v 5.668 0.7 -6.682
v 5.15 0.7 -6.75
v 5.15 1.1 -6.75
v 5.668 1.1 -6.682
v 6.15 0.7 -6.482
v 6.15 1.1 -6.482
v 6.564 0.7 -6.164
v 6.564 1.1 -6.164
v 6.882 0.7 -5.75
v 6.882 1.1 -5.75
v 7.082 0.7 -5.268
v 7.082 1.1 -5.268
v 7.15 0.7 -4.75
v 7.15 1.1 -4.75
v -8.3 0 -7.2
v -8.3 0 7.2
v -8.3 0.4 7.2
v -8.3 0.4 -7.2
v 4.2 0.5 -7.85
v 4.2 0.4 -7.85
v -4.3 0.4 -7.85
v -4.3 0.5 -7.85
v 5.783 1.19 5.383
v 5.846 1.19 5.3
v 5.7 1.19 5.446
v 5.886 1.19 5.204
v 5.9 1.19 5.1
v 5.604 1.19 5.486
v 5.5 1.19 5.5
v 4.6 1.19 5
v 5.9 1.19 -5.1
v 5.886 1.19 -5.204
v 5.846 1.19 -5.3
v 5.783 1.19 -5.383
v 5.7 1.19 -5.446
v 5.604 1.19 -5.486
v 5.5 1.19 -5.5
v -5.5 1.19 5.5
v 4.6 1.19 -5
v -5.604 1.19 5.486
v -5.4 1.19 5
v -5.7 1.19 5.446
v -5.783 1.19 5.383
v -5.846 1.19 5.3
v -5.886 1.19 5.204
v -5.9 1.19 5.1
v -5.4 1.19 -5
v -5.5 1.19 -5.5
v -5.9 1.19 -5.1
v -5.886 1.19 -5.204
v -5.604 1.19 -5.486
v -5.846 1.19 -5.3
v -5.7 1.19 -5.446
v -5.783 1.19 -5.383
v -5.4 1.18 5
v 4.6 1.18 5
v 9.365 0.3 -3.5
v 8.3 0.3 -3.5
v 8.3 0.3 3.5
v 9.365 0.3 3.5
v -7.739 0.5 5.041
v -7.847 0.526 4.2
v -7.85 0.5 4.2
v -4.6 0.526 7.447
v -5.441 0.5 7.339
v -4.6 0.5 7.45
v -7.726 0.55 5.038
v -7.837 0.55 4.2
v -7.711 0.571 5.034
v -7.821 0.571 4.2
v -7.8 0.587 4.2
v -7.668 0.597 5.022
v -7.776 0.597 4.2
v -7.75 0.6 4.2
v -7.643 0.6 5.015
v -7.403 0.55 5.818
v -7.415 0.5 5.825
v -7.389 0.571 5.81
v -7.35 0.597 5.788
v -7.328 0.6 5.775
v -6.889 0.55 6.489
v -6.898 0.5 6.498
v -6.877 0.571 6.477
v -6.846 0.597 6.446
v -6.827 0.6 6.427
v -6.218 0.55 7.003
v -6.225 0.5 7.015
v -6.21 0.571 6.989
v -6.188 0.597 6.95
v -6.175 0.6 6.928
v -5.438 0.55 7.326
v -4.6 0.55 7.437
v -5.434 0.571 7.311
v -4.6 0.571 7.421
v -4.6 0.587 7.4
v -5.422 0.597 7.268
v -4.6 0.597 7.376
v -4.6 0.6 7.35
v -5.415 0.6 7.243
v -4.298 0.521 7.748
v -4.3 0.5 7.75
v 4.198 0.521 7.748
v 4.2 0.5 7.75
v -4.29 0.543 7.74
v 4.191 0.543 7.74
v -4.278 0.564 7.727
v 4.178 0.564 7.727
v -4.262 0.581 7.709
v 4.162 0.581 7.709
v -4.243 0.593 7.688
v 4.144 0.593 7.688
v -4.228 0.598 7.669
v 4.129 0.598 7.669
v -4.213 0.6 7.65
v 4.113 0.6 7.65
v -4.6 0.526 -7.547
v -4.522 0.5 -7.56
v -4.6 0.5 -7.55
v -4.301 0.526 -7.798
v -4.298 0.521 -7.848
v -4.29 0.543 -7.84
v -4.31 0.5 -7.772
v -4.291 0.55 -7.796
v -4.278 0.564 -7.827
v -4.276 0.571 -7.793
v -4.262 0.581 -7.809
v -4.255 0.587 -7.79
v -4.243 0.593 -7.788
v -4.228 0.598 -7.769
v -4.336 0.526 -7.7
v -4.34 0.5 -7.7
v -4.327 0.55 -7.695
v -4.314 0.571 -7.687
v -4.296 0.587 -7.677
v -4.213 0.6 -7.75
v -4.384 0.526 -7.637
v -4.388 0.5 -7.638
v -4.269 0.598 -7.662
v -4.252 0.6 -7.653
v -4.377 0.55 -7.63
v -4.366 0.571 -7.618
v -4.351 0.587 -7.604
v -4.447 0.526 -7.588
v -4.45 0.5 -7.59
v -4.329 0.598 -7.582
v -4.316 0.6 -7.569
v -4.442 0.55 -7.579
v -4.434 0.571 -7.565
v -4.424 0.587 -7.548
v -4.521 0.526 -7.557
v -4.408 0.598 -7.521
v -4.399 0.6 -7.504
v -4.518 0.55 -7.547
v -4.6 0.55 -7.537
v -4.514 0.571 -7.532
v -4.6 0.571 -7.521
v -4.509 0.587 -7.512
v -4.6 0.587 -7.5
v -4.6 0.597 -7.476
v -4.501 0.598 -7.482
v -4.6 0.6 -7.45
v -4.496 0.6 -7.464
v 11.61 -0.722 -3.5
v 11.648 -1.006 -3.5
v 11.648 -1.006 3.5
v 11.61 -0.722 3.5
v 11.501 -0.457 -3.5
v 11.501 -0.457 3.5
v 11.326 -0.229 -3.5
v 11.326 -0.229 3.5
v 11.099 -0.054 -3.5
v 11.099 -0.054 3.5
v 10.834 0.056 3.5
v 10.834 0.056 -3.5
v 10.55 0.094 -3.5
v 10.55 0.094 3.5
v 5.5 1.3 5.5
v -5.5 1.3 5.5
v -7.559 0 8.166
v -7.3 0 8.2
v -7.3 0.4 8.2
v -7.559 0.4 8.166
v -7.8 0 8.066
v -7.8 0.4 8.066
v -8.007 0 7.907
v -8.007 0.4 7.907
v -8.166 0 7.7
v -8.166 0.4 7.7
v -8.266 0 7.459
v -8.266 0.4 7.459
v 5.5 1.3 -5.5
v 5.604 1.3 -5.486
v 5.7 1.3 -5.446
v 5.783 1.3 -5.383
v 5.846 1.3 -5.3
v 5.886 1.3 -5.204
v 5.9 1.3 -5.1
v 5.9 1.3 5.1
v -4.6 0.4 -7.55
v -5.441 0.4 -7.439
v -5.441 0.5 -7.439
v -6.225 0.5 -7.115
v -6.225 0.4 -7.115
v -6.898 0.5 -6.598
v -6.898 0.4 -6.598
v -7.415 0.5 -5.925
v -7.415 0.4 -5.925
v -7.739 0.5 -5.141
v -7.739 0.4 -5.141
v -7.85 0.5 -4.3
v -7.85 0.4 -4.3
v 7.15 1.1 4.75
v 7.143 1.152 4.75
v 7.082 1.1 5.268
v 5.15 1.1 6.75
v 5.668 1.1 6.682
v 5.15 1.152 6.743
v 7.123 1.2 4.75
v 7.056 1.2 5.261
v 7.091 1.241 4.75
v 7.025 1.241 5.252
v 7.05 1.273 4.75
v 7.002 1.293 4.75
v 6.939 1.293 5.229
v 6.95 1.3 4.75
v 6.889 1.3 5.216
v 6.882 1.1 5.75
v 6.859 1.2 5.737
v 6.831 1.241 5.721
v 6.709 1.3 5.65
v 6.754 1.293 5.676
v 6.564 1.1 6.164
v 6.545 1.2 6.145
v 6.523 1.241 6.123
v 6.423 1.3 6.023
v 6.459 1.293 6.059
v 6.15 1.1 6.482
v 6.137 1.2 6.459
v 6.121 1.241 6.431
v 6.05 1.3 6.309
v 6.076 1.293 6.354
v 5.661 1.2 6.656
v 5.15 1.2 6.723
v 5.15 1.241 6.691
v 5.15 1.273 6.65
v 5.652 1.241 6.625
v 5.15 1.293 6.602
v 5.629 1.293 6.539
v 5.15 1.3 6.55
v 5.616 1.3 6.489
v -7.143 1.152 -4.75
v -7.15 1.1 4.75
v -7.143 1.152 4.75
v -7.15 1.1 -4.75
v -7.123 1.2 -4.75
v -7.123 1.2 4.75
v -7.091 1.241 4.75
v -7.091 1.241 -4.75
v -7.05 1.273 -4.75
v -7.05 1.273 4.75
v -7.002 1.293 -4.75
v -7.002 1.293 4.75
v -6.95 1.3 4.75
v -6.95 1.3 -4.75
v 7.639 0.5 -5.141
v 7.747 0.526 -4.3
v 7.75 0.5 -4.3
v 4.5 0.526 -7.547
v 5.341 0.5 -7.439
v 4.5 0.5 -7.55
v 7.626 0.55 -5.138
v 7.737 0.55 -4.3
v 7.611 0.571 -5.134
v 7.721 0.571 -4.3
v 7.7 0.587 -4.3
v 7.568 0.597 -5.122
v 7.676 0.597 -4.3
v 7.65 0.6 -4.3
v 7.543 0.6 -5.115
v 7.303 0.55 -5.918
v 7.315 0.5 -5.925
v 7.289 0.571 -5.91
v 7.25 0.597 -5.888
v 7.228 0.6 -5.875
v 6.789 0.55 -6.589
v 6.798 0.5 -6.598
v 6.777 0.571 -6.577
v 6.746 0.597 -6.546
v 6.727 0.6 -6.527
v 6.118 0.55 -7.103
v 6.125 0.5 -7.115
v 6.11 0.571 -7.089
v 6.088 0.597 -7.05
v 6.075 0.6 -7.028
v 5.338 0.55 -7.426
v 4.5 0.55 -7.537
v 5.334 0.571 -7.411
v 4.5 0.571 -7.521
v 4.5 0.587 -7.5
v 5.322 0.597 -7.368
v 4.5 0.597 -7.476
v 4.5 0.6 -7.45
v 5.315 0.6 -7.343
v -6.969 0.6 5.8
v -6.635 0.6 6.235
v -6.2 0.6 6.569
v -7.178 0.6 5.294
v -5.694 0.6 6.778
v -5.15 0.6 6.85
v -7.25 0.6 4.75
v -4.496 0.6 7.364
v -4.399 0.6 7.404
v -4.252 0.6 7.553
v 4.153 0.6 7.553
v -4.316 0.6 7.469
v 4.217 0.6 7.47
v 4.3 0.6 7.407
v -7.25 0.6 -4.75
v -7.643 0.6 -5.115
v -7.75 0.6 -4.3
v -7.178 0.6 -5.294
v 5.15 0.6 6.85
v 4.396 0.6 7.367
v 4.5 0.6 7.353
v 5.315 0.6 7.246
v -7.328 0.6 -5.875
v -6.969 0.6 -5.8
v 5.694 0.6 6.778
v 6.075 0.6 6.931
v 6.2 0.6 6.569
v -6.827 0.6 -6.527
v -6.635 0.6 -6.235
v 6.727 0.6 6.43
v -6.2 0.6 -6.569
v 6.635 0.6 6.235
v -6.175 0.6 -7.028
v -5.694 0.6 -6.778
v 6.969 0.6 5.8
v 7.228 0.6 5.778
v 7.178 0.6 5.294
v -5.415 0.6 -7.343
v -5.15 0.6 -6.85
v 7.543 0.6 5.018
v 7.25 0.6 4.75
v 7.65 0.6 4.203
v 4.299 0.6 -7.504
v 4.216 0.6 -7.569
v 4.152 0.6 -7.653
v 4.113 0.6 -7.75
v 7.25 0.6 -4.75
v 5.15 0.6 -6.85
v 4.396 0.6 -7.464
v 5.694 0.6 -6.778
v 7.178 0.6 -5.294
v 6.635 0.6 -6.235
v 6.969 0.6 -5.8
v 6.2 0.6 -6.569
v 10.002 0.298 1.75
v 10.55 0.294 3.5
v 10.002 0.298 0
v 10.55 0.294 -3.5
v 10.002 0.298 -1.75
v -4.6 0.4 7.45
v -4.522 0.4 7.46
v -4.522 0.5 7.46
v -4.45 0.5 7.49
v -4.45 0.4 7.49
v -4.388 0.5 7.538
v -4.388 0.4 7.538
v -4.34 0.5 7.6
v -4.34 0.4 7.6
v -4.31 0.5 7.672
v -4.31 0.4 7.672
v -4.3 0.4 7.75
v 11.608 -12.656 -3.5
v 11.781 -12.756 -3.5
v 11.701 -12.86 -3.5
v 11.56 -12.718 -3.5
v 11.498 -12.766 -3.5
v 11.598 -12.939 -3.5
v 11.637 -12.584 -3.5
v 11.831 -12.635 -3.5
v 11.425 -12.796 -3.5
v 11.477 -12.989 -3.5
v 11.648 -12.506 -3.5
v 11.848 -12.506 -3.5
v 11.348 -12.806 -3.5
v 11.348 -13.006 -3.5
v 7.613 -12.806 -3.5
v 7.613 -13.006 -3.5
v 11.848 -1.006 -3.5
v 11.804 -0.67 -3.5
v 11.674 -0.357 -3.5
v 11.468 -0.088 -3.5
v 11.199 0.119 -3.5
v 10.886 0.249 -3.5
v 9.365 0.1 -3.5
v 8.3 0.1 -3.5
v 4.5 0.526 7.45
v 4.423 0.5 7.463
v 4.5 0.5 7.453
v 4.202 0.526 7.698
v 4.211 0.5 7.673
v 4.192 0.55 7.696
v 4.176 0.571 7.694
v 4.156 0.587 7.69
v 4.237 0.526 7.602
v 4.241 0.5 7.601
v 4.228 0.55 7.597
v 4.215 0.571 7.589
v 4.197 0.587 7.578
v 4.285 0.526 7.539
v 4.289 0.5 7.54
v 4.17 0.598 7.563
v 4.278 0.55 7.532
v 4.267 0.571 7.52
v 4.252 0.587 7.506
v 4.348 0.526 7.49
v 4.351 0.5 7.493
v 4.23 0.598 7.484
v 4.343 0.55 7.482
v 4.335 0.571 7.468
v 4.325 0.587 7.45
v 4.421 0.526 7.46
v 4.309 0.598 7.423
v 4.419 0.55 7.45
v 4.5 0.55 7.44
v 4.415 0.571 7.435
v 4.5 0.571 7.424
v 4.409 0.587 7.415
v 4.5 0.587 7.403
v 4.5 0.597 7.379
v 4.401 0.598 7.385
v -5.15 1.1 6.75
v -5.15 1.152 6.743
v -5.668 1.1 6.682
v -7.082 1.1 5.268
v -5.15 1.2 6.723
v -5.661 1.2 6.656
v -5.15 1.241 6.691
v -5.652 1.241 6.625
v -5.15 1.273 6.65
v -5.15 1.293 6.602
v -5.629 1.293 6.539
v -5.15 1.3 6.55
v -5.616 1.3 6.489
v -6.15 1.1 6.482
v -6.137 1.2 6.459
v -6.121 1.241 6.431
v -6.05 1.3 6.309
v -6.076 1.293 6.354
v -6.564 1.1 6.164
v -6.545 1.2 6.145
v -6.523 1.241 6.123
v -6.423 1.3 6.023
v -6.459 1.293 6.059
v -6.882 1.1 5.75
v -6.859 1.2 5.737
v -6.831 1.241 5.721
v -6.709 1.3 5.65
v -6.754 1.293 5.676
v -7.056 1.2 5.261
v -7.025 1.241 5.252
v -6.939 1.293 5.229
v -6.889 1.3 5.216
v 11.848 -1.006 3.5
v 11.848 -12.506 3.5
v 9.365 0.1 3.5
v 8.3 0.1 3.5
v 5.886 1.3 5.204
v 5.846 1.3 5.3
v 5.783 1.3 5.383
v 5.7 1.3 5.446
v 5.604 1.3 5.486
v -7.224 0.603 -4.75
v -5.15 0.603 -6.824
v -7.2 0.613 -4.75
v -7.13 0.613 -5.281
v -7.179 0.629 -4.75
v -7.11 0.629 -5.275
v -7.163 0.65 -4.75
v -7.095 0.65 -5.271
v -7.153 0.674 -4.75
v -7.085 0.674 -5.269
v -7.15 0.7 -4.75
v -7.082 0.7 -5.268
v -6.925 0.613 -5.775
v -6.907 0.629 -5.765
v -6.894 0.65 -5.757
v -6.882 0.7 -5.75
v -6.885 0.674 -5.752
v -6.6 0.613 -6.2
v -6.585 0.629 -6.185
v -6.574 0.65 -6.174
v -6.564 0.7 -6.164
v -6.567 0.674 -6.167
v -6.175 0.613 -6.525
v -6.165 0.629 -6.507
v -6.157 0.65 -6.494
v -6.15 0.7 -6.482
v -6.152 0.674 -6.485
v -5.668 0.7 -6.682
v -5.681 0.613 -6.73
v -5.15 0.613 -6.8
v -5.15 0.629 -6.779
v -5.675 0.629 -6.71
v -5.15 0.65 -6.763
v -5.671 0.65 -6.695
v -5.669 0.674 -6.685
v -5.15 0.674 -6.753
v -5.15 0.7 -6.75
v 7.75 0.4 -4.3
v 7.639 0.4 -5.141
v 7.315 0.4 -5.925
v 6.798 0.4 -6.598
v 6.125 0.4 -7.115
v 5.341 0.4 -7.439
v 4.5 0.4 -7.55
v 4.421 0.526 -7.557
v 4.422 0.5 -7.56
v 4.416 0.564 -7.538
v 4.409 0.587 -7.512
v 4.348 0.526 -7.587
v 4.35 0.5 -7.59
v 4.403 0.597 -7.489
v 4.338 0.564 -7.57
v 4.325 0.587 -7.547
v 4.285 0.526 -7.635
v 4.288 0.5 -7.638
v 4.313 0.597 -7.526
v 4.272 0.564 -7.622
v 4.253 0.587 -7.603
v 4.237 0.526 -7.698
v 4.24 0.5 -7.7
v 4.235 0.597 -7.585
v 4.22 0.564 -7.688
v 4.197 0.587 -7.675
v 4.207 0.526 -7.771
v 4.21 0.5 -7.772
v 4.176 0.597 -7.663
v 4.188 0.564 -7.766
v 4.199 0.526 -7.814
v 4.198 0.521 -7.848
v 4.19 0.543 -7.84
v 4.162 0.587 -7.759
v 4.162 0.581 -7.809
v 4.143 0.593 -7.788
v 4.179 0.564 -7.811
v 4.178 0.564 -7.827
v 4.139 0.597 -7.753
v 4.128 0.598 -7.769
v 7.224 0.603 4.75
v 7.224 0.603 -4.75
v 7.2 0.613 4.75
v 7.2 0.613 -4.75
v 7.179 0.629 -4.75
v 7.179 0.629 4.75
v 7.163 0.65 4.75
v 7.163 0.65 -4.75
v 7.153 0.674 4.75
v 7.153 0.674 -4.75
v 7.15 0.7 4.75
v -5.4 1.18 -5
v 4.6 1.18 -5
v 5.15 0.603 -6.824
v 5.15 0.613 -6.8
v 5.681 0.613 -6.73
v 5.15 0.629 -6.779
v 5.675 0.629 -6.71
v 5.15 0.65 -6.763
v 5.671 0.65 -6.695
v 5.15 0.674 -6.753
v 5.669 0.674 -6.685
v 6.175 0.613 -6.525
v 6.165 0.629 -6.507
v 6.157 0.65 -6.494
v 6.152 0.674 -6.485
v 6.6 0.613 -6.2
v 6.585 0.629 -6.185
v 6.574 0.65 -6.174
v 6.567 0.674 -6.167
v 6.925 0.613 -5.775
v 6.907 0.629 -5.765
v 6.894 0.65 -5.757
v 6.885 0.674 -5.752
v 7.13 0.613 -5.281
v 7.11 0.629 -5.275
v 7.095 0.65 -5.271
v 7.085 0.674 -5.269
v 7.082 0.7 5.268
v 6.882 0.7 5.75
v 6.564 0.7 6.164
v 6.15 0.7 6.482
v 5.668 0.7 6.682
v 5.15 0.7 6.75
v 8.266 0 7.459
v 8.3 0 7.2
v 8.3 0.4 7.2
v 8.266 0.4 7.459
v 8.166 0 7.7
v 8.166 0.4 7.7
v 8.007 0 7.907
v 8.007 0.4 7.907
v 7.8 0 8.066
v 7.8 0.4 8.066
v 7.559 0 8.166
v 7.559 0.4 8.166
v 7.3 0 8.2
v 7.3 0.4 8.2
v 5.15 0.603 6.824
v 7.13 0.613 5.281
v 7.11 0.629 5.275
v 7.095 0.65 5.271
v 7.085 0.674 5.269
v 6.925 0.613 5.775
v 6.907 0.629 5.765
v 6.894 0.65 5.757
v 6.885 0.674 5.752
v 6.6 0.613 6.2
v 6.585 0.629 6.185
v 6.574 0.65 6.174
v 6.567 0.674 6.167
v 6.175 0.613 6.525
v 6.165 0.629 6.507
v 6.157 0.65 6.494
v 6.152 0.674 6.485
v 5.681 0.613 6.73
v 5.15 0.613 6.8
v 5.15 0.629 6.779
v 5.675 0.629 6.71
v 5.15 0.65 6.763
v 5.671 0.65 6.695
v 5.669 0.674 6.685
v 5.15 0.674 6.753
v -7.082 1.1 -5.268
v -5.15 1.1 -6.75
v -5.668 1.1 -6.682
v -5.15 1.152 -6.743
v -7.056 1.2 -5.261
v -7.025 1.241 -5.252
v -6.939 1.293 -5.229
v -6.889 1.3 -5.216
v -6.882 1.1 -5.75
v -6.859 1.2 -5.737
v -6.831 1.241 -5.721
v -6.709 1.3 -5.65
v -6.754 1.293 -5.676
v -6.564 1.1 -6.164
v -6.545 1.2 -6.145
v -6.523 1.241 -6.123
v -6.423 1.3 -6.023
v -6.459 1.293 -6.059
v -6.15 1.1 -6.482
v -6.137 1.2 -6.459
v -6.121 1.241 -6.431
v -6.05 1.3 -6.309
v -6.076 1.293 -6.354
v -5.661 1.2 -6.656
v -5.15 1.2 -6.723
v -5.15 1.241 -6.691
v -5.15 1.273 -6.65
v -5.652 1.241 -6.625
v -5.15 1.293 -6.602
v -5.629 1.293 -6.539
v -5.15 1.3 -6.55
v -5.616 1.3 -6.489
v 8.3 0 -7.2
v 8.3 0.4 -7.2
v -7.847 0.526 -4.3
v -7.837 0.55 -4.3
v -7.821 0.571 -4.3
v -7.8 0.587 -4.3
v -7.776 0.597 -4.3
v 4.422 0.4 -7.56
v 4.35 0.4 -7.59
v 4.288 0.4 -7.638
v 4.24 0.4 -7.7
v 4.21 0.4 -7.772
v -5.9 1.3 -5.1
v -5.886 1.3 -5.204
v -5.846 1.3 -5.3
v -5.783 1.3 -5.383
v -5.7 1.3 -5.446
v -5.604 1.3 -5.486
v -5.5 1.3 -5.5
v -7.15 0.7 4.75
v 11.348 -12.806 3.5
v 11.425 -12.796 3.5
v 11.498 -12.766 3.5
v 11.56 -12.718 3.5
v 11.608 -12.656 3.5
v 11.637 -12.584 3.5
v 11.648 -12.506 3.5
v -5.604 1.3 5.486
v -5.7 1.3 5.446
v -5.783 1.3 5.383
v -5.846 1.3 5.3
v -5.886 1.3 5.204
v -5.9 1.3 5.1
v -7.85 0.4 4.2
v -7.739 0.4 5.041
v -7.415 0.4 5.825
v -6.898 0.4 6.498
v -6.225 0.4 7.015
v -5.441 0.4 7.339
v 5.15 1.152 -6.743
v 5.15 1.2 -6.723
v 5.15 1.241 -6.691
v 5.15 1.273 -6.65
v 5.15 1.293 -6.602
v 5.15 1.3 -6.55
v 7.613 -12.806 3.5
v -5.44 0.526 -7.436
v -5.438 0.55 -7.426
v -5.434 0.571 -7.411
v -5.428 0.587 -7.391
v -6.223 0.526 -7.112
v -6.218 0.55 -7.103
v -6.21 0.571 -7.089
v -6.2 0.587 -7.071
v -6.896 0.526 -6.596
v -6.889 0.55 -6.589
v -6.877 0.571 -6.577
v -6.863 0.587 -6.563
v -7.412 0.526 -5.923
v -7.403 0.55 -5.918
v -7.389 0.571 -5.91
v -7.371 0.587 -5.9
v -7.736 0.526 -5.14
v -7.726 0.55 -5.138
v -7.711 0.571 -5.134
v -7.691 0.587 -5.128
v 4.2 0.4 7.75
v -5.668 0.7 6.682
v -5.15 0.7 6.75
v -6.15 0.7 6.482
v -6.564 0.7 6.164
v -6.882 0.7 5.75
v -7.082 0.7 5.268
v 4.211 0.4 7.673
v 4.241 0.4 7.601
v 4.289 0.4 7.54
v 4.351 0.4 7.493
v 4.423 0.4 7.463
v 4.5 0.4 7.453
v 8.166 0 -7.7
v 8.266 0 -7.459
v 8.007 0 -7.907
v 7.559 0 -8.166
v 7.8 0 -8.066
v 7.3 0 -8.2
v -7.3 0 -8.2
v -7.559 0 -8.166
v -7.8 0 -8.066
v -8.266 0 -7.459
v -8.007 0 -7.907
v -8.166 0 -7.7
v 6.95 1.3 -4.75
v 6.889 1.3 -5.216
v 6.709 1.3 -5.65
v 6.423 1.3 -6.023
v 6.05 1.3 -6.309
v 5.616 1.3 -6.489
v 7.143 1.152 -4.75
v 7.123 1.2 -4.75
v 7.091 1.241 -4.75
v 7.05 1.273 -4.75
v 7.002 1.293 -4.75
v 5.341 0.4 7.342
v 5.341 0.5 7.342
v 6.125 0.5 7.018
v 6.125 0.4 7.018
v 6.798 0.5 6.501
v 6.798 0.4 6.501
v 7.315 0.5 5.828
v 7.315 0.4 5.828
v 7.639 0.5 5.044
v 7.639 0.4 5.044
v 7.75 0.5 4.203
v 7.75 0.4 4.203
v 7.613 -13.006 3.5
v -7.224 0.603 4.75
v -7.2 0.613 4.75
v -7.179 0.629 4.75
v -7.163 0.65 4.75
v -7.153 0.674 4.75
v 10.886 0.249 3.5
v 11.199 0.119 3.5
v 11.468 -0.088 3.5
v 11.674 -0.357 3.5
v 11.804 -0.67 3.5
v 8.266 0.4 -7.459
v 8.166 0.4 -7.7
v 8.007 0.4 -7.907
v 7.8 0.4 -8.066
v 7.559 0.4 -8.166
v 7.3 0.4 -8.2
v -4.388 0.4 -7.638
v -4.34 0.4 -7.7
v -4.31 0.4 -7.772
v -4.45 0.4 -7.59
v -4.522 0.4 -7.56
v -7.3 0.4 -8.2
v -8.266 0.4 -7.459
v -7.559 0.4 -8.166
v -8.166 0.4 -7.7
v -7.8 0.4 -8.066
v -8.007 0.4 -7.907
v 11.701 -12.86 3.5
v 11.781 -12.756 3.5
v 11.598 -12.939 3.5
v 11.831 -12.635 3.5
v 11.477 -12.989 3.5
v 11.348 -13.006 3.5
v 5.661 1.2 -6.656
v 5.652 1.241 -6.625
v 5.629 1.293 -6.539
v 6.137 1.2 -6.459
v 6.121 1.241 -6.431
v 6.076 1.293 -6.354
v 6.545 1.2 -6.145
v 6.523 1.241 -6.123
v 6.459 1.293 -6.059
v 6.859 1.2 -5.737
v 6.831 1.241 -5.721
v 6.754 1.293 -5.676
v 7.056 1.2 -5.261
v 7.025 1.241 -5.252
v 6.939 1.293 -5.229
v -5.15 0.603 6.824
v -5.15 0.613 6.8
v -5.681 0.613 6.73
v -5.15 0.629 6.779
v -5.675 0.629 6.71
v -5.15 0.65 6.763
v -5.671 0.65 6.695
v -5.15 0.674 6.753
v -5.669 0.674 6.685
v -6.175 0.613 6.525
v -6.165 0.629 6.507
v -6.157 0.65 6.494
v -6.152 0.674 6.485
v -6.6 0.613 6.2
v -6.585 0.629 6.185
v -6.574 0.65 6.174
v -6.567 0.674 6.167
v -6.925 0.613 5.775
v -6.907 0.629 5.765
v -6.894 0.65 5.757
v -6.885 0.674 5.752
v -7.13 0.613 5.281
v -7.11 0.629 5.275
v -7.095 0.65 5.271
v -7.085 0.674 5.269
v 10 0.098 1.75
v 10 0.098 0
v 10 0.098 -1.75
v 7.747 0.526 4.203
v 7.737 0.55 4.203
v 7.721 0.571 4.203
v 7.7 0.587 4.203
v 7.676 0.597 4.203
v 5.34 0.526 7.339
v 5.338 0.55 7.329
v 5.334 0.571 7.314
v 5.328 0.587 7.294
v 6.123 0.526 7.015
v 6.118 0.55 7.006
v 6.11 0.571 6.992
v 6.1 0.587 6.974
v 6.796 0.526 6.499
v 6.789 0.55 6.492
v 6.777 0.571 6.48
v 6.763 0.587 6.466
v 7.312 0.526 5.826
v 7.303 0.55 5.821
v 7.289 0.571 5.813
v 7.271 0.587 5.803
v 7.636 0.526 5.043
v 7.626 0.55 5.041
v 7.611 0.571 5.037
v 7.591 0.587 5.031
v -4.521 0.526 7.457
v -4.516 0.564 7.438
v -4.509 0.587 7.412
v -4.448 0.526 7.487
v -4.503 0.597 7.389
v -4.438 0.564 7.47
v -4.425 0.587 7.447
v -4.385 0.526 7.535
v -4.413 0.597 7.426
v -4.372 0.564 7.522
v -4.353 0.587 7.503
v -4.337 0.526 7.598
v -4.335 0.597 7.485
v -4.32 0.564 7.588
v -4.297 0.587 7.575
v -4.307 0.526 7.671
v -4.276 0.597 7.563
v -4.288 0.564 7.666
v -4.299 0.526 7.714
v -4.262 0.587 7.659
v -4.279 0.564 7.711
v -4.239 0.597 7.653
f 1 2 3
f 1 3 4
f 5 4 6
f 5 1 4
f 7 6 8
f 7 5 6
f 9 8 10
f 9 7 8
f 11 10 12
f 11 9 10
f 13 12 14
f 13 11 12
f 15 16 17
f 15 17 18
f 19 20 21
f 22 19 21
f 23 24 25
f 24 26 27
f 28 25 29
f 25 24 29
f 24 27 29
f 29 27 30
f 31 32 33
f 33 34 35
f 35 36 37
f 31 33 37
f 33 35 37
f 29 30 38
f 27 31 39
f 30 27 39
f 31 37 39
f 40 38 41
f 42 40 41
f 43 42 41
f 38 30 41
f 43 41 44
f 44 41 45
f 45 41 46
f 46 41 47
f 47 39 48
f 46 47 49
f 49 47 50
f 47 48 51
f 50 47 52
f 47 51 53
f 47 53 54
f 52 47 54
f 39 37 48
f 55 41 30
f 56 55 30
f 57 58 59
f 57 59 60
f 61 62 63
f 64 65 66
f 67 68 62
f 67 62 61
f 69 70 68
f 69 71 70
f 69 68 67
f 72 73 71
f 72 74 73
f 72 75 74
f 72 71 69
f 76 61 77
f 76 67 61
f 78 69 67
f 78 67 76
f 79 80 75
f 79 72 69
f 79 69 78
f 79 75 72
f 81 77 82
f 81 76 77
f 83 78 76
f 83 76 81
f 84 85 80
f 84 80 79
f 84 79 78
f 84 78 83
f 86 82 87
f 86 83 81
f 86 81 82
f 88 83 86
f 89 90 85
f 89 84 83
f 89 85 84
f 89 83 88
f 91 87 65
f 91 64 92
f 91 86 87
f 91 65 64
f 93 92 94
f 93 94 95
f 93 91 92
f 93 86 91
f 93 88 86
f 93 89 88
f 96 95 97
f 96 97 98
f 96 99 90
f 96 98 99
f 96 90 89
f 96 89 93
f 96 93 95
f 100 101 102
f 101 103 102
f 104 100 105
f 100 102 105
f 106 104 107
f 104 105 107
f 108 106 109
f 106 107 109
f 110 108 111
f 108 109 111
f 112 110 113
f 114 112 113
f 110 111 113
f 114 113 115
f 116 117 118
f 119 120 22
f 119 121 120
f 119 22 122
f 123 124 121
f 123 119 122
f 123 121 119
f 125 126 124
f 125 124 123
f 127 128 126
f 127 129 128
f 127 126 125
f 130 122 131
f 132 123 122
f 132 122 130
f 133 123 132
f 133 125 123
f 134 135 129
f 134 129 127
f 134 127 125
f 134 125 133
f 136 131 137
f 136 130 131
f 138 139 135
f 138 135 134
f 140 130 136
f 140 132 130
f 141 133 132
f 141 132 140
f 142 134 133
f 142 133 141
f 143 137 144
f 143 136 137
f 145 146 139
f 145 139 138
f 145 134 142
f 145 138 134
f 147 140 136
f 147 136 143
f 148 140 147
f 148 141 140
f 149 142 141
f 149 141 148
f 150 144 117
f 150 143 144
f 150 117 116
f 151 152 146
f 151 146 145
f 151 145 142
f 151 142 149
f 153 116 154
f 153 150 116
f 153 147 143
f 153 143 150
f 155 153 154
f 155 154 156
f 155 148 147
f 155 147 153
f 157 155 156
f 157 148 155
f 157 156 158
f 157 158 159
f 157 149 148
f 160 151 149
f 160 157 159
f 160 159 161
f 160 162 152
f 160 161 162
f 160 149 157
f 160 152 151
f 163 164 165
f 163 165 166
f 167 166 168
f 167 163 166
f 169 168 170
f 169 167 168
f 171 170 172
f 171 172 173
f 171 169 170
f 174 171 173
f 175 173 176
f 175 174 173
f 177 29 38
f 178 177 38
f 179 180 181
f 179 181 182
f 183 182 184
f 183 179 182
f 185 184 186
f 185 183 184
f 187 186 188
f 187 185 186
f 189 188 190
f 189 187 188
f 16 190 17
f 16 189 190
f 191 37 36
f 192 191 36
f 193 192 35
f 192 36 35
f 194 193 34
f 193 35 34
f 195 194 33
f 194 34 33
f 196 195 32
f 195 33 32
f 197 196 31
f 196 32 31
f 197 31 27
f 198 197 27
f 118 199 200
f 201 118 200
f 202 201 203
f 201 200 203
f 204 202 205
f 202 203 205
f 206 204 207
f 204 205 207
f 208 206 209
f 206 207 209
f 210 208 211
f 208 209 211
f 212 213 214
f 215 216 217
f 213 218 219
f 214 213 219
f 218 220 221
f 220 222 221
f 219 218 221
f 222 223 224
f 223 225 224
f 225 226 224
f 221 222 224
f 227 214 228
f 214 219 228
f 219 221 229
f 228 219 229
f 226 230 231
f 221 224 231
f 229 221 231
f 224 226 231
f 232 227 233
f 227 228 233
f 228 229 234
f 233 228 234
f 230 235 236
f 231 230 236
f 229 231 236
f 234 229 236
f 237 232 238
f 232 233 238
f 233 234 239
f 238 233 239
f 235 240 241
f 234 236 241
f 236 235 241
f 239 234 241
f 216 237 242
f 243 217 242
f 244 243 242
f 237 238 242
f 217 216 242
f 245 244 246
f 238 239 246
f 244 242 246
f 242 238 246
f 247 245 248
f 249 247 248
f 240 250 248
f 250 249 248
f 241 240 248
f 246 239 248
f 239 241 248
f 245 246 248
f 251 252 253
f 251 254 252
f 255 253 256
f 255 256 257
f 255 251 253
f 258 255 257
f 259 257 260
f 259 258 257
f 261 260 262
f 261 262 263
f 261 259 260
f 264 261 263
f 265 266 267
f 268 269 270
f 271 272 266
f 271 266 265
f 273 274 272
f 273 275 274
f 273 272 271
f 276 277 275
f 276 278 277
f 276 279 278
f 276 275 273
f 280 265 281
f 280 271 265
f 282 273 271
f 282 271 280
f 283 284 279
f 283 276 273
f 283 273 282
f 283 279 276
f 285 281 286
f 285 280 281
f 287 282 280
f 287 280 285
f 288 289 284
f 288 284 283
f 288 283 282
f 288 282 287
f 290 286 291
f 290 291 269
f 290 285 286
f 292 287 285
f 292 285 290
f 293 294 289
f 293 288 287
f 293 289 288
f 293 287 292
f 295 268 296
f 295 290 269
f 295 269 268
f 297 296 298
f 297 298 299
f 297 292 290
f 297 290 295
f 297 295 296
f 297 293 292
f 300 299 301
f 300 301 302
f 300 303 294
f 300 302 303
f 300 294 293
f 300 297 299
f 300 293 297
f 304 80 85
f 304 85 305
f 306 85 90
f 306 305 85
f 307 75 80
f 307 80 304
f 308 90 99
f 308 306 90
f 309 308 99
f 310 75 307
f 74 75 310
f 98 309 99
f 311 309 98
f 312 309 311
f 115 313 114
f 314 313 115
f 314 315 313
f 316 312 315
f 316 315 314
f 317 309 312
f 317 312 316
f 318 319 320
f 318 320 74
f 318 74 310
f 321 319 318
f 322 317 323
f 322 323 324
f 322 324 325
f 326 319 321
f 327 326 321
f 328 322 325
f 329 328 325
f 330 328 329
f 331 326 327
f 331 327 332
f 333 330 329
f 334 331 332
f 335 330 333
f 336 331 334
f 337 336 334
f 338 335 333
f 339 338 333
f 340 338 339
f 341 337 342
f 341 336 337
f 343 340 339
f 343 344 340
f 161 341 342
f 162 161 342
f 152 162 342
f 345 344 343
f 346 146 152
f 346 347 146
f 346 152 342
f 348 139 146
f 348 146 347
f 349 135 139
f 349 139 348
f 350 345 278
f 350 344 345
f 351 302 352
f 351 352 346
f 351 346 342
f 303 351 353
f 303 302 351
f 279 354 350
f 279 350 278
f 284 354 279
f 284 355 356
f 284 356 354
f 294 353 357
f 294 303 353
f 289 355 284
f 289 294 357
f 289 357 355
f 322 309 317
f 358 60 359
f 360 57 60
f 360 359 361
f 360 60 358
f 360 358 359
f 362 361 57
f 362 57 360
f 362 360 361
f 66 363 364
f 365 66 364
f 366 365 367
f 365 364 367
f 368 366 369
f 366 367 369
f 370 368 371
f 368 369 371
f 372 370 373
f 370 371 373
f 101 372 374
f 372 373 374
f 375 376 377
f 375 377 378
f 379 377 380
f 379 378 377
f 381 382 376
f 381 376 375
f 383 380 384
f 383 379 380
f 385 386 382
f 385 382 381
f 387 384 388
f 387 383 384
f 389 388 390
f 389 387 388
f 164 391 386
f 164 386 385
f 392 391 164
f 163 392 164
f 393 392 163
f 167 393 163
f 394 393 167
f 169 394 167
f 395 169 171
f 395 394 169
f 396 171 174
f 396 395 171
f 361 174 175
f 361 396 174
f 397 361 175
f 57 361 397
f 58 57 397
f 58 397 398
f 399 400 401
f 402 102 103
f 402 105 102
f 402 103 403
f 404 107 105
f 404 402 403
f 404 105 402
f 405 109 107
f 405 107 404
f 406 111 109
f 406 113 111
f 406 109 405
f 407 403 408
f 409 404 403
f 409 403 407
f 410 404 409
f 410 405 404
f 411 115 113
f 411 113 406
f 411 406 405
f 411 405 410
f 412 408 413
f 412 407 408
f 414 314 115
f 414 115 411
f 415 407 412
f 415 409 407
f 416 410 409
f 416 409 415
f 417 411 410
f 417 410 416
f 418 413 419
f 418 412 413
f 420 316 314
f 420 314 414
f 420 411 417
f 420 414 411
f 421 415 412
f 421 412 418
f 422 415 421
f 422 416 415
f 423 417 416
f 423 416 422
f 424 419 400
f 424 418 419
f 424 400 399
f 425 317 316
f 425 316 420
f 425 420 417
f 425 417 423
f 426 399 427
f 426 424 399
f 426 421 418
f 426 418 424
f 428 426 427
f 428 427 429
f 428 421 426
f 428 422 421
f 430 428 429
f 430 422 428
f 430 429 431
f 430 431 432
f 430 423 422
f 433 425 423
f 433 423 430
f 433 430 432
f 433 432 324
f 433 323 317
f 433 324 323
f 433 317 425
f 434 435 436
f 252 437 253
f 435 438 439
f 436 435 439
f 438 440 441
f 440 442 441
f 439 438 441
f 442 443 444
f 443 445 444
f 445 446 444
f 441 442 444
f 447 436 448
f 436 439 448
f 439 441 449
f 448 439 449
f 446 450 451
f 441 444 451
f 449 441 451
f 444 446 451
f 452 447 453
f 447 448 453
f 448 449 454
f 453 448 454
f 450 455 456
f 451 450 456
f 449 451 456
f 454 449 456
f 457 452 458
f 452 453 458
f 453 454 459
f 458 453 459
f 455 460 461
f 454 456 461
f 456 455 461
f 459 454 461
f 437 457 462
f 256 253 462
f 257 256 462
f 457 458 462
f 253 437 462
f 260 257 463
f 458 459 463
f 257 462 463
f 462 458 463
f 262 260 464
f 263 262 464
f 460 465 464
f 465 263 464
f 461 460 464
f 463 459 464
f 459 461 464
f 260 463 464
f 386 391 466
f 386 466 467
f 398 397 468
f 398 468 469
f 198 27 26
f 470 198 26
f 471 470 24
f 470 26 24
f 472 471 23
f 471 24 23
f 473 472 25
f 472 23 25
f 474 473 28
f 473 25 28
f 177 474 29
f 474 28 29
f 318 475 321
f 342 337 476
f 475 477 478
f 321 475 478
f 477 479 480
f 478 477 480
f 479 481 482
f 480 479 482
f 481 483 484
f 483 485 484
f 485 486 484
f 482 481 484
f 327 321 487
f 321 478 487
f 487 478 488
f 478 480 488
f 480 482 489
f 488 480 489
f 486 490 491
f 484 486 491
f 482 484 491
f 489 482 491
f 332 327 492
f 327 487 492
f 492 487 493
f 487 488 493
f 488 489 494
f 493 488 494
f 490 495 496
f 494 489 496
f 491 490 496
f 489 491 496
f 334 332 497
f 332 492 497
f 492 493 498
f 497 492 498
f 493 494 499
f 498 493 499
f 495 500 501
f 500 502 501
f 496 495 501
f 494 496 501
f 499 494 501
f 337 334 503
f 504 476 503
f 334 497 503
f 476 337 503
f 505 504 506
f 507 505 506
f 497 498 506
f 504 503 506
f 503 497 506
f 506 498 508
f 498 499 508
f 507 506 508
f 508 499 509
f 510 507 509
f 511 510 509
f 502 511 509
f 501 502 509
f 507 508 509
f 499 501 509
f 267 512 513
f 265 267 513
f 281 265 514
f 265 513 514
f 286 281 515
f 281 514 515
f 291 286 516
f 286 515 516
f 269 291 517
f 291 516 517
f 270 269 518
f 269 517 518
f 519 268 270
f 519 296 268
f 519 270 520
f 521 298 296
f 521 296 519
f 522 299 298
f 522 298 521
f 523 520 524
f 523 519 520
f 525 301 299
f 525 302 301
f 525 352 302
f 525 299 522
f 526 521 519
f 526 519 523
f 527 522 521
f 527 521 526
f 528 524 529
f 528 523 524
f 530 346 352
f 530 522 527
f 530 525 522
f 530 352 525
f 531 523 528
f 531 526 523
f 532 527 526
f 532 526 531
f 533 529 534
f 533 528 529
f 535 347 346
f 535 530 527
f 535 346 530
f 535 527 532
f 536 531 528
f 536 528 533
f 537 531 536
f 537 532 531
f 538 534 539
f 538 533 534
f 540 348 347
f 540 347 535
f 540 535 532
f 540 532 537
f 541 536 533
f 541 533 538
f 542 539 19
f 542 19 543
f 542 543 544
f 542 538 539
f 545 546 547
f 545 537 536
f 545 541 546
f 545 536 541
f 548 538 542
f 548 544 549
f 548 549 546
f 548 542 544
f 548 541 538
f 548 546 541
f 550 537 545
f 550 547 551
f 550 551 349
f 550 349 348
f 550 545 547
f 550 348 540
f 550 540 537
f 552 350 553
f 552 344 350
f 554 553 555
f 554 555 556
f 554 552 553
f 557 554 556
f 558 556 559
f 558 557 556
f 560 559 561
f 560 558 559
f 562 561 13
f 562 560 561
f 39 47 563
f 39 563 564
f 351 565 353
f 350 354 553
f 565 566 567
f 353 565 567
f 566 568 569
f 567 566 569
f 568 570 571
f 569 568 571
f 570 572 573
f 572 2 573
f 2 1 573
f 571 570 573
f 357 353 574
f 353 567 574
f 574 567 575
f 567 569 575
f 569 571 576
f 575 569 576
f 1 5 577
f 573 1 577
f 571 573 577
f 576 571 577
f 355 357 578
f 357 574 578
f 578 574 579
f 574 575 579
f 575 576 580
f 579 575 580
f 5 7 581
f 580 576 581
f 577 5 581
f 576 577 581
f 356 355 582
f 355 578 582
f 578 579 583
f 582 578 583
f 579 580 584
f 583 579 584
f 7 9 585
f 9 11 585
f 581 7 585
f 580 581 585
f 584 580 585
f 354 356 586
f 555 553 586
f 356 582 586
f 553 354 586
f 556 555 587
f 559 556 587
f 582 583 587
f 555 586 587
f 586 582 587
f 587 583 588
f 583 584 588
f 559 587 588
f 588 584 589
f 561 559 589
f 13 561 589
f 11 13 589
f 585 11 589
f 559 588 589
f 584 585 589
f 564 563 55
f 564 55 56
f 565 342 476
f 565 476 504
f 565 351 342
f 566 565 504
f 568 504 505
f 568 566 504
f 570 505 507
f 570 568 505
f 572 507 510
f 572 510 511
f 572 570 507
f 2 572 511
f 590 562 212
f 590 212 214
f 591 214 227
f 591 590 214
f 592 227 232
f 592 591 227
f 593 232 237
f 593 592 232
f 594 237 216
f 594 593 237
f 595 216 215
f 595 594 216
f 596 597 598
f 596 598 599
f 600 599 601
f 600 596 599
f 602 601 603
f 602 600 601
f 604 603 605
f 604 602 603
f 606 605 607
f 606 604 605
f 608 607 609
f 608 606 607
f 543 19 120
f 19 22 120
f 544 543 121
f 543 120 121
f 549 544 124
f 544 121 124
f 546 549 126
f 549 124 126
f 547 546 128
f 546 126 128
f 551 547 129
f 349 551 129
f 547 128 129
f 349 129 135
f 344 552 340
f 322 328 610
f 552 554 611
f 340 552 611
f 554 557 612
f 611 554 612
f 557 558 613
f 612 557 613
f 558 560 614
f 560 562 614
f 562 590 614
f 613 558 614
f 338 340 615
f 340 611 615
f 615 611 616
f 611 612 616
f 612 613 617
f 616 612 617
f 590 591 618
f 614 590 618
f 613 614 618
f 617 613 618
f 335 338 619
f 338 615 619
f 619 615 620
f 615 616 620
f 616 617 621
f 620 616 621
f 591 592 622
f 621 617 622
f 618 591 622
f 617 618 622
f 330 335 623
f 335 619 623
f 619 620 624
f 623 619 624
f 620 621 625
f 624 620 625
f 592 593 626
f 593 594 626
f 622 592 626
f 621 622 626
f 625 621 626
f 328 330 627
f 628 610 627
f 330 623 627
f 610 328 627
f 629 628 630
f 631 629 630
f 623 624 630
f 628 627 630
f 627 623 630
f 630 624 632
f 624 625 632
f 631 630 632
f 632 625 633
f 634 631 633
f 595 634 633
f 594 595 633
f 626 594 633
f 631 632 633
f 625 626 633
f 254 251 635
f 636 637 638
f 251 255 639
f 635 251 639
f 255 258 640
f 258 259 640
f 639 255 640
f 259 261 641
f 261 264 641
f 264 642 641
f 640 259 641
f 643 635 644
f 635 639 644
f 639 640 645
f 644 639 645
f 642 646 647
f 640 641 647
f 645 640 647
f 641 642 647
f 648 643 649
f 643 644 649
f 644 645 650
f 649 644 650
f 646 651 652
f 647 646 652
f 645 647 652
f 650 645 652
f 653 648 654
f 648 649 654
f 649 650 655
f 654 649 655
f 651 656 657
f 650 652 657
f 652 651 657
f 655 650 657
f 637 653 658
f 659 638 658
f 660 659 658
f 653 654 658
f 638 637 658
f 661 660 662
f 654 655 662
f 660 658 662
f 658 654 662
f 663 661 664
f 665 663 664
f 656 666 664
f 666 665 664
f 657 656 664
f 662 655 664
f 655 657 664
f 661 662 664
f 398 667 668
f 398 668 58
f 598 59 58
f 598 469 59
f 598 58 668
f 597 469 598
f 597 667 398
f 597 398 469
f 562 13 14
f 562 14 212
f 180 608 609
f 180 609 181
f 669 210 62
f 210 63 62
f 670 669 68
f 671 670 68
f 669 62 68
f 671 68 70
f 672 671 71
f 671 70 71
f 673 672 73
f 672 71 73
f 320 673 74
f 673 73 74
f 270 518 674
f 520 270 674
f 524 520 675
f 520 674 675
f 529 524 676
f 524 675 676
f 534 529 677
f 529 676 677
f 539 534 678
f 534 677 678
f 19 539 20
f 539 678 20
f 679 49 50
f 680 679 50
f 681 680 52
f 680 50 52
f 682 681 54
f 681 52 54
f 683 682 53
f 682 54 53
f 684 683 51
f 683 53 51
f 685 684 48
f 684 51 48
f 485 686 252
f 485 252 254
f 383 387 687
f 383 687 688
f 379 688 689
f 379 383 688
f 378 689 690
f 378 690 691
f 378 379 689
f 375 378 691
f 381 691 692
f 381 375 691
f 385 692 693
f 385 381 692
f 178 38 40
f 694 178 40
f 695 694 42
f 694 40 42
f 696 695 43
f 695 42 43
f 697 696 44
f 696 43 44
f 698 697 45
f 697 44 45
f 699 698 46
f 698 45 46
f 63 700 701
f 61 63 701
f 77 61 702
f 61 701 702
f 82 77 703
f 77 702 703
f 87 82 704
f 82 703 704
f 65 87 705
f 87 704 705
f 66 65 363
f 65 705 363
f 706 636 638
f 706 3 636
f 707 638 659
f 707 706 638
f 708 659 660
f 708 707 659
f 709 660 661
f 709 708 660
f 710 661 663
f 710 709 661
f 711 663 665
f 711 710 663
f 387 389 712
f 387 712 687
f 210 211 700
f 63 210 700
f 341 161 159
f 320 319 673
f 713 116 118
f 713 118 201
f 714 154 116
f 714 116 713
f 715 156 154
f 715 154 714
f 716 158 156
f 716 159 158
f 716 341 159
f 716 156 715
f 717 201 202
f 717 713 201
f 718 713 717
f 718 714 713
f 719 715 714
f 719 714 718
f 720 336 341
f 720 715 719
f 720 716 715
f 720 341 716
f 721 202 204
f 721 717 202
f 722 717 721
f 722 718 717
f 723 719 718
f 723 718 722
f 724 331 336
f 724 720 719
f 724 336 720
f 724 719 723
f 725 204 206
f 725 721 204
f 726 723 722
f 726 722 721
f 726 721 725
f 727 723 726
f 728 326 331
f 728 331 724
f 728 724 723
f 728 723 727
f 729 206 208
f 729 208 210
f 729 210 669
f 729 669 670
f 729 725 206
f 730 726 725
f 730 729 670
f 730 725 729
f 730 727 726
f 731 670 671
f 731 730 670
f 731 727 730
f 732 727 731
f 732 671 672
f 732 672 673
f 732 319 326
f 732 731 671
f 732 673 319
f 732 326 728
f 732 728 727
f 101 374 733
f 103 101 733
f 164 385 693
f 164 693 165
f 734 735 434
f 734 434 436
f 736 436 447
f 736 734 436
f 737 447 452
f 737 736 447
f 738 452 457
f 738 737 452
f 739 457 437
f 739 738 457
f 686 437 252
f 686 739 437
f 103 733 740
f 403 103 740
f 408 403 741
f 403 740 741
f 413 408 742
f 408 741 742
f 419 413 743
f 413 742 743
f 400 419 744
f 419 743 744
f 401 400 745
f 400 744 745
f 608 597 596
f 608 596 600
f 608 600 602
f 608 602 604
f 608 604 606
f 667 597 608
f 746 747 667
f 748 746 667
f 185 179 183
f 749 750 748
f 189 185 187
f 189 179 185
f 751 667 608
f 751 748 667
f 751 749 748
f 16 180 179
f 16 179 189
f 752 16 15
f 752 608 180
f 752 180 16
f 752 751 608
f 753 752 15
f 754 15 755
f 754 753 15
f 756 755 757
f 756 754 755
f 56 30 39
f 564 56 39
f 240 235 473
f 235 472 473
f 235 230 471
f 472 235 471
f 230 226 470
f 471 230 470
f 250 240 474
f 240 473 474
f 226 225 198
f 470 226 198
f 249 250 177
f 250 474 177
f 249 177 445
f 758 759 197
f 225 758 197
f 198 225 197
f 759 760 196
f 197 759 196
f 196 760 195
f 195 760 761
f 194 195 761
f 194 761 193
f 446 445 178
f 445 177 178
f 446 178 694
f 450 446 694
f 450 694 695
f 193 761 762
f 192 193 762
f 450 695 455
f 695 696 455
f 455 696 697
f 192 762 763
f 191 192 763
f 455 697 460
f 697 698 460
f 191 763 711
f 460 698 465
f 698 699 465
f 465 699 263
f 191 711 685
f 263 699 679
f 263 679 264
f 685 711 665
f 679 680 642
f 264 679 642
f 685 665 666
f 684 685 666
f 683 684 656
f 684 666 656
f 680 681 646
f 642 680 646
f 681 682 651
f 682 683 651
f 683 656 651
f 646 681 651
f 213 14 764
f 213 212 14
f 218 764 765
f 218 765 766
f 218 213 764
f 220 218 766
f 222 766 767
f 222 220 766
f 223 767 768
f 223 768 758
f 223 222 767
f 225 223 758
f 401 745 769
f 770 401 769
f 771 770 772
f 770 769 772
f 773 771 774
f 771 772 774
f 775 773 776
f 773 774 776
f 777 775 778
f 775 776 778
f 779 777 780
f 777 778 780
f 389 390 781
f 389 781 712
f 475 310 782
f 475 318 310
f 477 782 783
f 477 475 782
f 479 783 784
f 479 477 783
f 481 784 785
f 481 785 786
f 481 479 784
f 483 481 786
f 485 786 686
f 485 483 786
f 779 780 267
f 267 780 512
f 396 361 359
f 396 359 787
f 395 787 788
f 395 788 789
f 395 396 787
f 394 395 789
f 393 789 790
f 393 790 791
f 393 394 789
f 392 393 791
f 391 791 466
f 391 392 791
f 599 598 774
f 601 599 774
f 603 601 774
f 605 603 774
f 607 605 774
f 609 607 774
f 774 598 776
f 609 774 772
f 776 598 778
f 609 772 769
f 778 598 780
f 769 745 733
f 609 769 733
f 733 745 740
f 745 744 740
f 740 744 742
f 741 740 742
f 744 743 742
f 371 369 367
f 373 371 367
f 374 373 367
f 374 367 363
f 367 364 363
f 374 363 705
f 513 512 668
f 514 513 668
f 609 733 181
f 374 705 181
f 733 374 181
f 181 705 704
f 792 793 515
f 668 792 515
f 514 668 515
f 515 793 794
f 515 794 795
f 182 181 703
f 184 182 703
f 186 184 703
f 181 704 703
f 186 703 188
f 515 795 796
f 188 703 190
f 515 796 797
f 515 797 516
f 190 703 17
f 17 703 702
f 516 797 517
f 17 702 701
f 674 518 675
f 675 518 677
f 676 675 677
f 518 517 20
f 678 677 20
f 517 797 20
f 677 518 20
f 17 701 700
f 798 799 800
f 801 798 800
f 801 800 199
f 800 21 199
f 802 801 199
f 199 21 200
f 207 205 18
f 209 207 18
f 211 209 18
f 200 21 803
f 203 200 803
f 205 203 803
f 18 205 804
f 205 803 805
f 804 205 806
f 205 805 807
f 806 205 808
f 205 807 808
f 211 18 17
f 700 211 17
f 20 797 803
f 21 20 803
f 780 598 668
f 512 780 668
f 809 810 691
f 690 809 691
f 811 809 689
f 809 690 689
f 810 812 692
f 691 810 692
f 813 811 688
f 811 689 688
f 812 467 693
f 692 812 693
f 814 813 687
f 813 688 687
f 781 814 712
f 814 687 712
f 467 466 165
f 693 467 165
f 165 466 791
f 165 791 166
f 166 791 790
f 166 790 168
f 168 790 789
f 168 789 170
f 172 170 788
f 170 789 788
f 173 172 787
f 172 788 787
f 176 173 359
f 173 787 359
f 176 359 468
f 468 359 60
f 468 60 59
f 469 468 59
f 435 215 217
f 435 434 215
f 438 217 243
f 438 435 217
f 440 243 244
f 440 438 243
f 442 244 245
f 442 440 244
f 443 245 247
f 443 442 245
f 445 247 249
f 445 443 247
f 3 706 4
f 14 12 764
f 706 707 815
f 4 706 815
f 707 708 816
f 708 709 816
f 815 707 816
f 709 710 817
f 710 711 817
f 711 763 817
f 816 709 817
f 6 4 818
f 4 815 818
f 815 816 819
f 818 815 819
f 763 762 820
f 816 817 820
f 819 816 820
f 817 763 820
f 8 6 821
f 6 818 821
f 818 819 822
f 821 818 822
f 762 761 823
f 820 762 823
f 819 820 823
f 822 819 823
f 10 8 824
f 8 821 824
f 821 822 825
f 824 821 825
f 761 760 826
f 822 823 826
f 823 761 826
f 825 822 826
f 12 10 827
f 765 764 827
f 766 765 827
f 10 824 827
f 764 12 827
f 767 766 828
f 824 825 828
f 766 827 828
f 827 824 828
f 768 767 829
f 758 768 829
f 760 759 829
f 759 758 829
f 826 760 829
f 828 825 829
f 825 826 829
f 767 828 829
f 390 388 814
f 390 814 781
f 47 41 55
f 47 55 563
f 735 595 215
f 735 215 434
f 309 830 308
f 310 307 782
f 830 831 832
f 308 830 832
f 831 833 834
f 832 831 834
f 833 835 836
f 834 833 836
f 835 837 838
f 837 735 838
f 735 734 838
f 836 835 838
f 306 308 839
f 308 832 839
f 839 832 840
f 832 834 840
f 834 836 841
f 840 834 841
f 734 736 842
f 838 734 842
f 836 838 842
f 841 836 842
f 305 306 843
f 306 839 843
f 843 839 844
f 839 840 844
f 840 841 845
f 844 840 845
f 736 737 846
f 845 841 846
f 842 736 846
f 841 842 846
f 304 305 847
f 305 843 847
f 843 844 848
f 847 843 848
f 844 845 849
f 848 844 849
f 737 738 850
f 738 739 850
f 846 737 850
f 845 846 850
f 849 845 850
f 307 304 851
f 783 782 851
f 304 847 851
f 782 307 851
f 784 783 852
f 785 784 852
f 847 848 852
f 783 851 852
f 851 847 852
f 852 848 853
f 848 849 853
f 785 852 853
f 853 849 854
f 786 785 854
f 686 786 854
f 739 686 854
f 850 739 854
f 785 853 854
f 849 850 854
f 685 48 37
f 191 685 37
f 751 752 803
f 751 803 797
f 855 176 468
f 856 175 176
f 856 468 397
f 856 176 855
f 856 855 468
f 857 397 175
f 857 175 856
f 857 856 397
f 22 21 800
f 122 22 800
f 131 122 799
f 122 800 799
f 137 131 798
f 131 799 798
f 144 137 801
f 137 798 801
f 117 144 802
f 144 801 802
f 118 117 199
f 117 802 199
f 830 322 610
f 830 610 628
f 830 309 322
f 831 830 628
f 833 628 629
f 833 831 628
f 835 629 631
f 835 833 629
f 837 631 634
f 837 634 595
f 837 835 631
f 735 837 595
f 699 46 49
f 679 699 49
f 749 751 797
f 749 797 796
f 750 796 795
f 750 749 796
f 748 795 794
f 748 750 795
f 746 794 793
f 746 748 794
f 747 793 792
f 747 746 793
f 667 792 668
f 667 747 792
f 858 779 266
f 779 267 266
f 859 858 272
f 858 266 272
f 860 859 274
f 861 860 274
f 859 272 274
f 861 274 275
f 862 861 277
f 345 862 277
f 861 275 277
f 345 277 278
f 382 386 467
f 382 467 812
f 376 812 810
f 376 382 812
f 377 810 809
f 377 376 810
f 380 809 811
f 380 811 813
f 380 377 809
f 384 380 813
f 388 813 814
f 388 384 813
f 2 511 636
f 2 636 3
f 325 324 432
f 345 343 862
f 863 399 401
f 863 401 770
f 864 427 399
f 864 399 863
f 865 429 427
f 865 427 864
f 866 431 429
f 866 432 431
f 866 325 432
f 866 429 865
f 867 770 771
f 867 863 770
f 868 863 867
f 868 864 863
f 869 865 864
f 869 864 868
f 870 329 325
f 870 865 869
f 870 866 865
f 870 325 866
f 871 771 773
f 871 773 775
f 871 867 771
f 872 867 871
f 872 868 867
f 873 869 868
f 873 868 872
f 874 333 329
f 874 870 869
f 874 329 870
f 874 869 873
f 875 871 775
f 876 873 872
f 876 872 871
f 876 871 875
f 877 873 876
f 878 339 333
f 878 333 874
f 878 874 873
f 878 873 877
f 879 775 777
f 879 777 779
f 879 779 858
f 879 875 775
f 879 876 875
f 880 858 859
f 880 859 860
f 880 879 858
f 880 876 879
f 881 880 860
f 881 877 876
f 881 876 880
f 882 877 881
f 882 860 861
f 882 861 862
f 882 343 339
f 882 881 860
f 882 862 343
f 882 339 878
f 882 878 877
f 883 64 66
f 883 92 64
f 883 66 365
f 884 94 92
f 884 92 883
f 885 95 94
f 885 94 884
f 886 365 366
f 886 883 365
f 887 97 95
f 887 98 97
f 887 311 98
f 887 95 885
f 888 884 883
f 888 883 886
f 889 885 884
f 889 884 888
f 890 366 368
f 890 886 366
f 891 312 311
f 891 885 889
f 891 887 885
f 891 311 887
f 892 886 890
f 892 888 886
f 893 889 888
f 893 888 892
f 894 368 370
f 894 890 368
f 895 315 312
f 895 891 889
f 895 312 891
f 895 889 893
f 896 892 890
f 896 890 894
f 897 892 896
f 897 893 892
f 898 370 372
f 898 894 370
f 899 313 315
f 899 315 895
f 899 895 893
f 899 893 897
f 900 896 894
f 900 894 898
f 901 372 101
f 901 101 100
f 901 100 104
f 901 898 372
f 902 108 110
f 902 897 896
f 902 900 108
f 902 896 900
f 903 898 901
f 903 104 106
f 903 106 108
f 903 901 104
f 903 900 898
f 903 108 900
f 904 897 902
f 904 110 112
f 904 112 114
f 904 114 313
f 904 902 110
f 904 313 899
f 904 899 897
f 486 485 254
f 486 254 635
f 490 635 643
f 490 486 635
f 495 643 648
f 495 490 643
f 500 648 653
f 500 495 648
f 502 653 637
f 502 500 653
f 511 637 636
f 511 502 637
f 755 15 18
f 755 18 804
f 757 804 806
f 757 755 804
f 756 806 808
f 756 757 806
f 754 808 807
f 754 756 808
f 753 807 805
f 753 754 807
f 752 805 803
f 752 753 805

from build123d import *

# Parameters (mm, degrees)
EXTRUDE_1_DEPTH      = 0.4
EXTRUDE_2_DEPTH      = 0.6
EXTRUDE_3_DEPTH      = 1.3
EXTRUDE_4_DEPTH      = 1.19
FILLET_1_R           = 0.1
FILLET_2_R           = 0.1
FILLET_3_R           = 0.2
EXTRUDE_5_DEPTH      = 3.5
EXTRUDE_5_DEPTH_BACK = 3.5
EXTRUDE_5_START      = -8.2
SKETCH_3_W           = 10
SKETCH_3_H           = 10
CUT_EXTRUDE_1_DEPTH  = 0.01


with BuildPart() as part:
    # 草图1 → 凸台-拉伸1 (new body)
    with BuildSketch(Plane(origin=(0, 0, 0), x_dir=(1, 0, 0), z_dir=(0, 1, 0))):
        with BuildLine():
            Line((7.3, -8.2), (-7.3, -8.2))
            ThreePointArc((-7.3, -8.2), (-8.007106781, -7.907106781), (-8.3, -7.2))
            Line((-8.3, -7.2), (-8.3, 7.2))
            ThreePointArc((-8.3, 7.2), (-8.007106781, 7.907106781), (-7.3, 8.2))
            Line((-7.3, 8.2), (7.3, 8.2))
            ThreePointArc((7.3, 8.2), (8.007106781, 7.907106781), (8.3, 7.2))
            Line((8.3, 7.2), (8.3, -7.2))
            ThreePointArc((8.3, -7.2), (8.007106781, -7.907106781), (7.3, -8.2))
        make_face()
        with BuildLine():
            Line((7.75, -4.202947793), (7.75, 4.3))
            ThreePointArc((7.75, 4.3), (6.798097039, 6.598097039), (4.5, 7.55))
            ThreePointArc((4.5, 7.55), (4.287867966, 7.637867966), (4.2, 7.85))
            Line((4.2, 7.85), (-4.3, 7.85))
            ThreePointArc((-4.3, 7.85), (-4.387867966, 7.637867966), (-4.6, 7.55))
            ThreePointArc((-4.6, 7.55), (-6.898097039, 6.598097039), (-7.85, 4.3))
            Line((-7.85, 4.3), (-7.85, -4.2))
            ThreePointArc((-7.85, -4.2), (-6.898094676, -6.498099402), (-4.599993316, -7.45))
            ThreePointArc((-4.599993316, -7.45), (-4.387860883, -7.537867748), (-4.299992699, -7.75))
            Line((-4.299992699, -7.75), (4.200007301, -7.75))
            ThreePointArc((4.200007301, -7.75), (4.288905774, -7.539775891), (4.499993425, -7.452947793))
            ThreePointArc((4.499993425, -7.452947793), (6.798094714, -6.501047157), (7.75, -4.202947793))
        make_face(mode=Mode.SUBTRACT)
    extrude(amount=EXTRUDE_1_DEPTH)

    # 草图1<3> → 凸台-拉伸2 (add)
    with BuildSketch(Plane(origin=(0, 0, 0), x_dir=(1, 0, 0), z_dir=(0, 1, 0))):
        with BuildLine():
            Line((7.75, -4.202947793), (7.75, 4.3))
            ThreePointArc((7.75, 4.3), (6.798097039, 6.598097039), (4.5, 7.55))
            ThreePointArc((4.5, 7.55), (4.287867966, 7.637867966), (4.2, 7.85))
            Line((4.2, 7.85), (-4.3, 7.85))
            ThreePointArc((-4.3, 7.85), (-4.387867966, 7.637867966), (-4.6, 7.55))
            ThreePointArc((-4.6, 7.55), (-6.898097039, 6.598097039), (-7.85, 4.3))
            Line((-7.85, 4.3), (-7.85, -4.2))
            ThreePointArc((-7.85, -4.2), (-6.898094676, -6.498099402), (-4.599993316, -7.45))
            ThreePointArc((-4.599993316, -7.45), (-4.387860883, -7.537867748), (-4.299992699, -7.75))
            Line((-4.299992699, -7.75), (4.200007301, -7.75))
            ThreePointArc((4.200007301, -7.75), (4.288905774, -7.539775891), (4.499993425, -7.452947793))
            ThreePointArc((4.499993425, -7.452947793), (6.798094714, -6.501047157), (7.75, -4.202947793))
        make_face()
        with BuildLine():
            Line((5.15, -6.75), (-5.15, -6.75))
            ThreePointArc((-5.15, -6.75), (-6.564213562, -6.164213562), (-7.15, -4.75))
            Line((-7.15, -4.75), (-7.15, 4.75))
            ThreePointArc((-7.15, 4.75), (-6.564213562, 6.164213562), (-5.15, 6.75))
            Line((-5.15, 6.75), (5.15, 6.75))
            ThreePointArc((5.15, 6.75), (6.564213562, 6.164213562), (7.15, 4.75))
            Line((7.15, 4.75), (7.15, -4.75))
            ThreePointArc((7.15, -4.75), (6.564213562, -6.164213562), (5.15, -6.75))
        make_face(mode=Mode.SUBTRACT)
    extrude(amount=EXTRUDE_2_DEPTH)

    # 草图1<4> → 凸台-拉伸3 (add)
    with BuildSketch(Plane(origin=(0, 0, 0), x_dir=(1, 0, 0), z_dir=(0, 1, 0))):
        with BuildLine():
            Line((5.15, -6.75), (-5.15, -6.75))
            ThreePointArc((-5.15, -6.75), (-6.564213562, -6.164213562), (-7.15, -4.75))
            Line((-7.15, -4.75), (-7.15, 4.75))
            ThreePointArc((-7.15, 4.75), (-6.564213562, 6.164213562), (-5.15, 6.75))
            Line((-5.15, 6.75), (5.15, 6.75))
            ThreePointArc((5.15, 6.75), (6.564213562, 6.164213562), (7.15, 4.75))
            Line((7.15, 4.75), (7.15, -4.75))
            ThreePointArc((7.15, -4.75), (6.564213562, -6.164213562), (5.15, -6.75))
        make_face()
        with BuildLine():
            Line((5.5, -5.5), (-5.5, -5.5))
            ThreePointArc((-5.5, -5.5), (-5.782842712, -5.382842712), (-5.9, -5.1))
            Line((-5.9, -5.1), (-5.9, 5.1))
            ThreePointArc((-5.9, 5.1), (-5.782842712, 5.382842712), (-5.5, 5.5))
            Line((-5.5, 5.5), (5.5, 5.5))
            ThreePointArc((5.5, 5.5), (5.782842712, 5.382842712), (5.9, 5.1))
            Line((5.9, 5.1), (5.9, -5.1))
            ThreePointArc((5.9, -5.1), (5.782842712, -5.382842712), (5.5, -5.5))
        make_face(mode=Mode.SUBTRACT)
    extrude(amount=EXTRUDE_3_DEPTH)

    # 草图1<5> → 凸台-拉伸4 (add)
    with BuildSketch(Plane(origin=(0, 0, 0), x_dir=(1, 0, 0), z_dir=(0, 1, 0))):
        with BuildLine():
            Line((-5.9, -5.1), (-5.9, 5.1))
            ThreePointArc((-5.9, 5.1), (-5.782842712, 5.382842712), (-5.5, 5.5))
            Line((-5.5, 5.5), (5.5, 5.5))
            ThreePointArc((5.5, 5.5), (5.782842712, 5.382842712), (5.9, 5.1))
            Line((5.9, 5.1), (5.9, -5.1))
            ThreePointArc((5.9, -5.1), (5.782842712, -5.382842712), (5.5, -5.5))
            Line((5.5, -5.5), (-5.5, -5.5))
            ThreePointArc((-5.5, -5.5), (-5.782842712, -5.382842712), (-5.9, -5.1))
        make_face()
    extrude(amount=EXTRUDE_4_DEPTH)

    # 圆角1
    fillet_1_edges = [part.edges().sort_by_distance(p)[0] for p in [
        (-6.898094676, 0.6, 6.498099402),
        (-0.049992699, 0.6, 7.75),
        (4.288905774, 0.6, 7.539775891),
        (-4.387867966, 0.6, -7.637867966),
        (-7.85, 0.6, -0.05),
        (-4.387860883, 0.6, 7.537867748),
        (6.798094714, 0.6, 6.501047157),
        (7.75, 0.6, -0.048526103),
        (6.798097039, 0.6, -6.598097039),
        (4.287867966, 0.6, -7.637867966),
        (-0.05, 0.6, -7.85),
        (-6.898097039, 0.6, -6.598097039),
    ]]
    fillet(fillet_1_edges, radius=FILLET_1_R)

    # 圆角2
    fillet_2_edges = [part.edges().sort_by_distance(p)[0] for p in [
        (-6.564213562, 0.6, -6.164213562),
        (0, 0.6, -6.75),
        (6.564213562, 0.6, -6.164213562),
        (7.15, 0.6, 0),
        (6.564213562, 0.6, 6.164213562),
        (0, 0.6, 6.75),
        (-6.564213562, 0.6, 6.164213562),
        (-7.15, 0.6, 0),
    ]]
    fillet(fillet_2_edges, radius=FILLET_2_R)

    # 圆角3
    fillet_3_edges = [part.edges().sort_by_distance(p)[0] for p in [
        (-7.15, 1.3, 0),
        (-6.564213562, 1.3, 6.164213562),
        (0, 1.3, 6.75),
        (0, 1.3, -6.75),
        (-6.564213562, 1.3, -6.164213562),
        (6.564213562, 1.3, 6.164213562),
        (7.15, 1.3, 0),
        (6.564213562, 1.3, -6.164213562),
    ]]
    fillet(fillet_3_edges, radius=FILLET_3_R)

    # 草图2 → 凸台-拉伸5 (add, two sides: drawn at the far end of the back side and taken through both)
    with BuildSketch(Plane.XY.offset(8.2).offset(EXTRUDE_5_START - EXTRUDE_5_DEPTH_BACK)):
        with BuildLine():
            Line((8.3, 0.3), (9.365071607, 0.300002674))
            add(Edge.make_bspline(
                [(9.365071607, 0.300002674), (9.466251692, 0.300426751), (9.659413087, 0.300043909), (10.004363297, 0.297823417), (10.333713629, 0.295164588), (10.471404473, 0.294160487), (10.550486094, 0.293991669)],
                knots=[0.000465859, 0.000465859, 0.000465859, 0.000465859, 0.099748113, 0.199030367, 0.298312622, 0.397594876, 0.397594876, 0.397594876, 0.397594876], degree=3))
            ThreePointArc((10.550486094, 0.293991669), (11.467930406, -0.087748238), (11.847710954, -1.006005369))
            Line((11.847710954, -1.006005369), (11.847710954, -12.506005369))
            ThreePointArc((11.847710954, -12.506005369), (11.701264344, -12.85955876), (11.347710954, -13.006005369))
            Line((11.347710954, -13.006005369), (7.613209707, -13.006005369))
            Line((7.613209707, -13.006005369), (7.613209707, -12.806005369))
            Line((7.613209707, -12.806005369), (11.347710954, -12.806005369))
            ThreePointArc((11.347710954, -12.806005369), (11.559842988, -12.718137403), (11.647710954, -12.506005369))
            Line((11.647710954, -12.506005369), (11.647710954, -1.006005369))
            ThreePointArc((11.647710954, -1.006005369), (11.326358183, -0.229018566), (10.550059149, 0.093992125))
            add(Edge.make_bspline(
                [(10.550059149, 0.093992125), (10.470549094, 0.094161857), (10.331716757, 0.095173419), (10.002362016, 0.097833701), (9.657479111, 0.100049329), (9.465720155, 0.100426879), (9.365071614, 0.1000009)],
                knots=[0.000156882, 0.000156882, 0.000156882, 0.000156882, 0.099516381, 0.198875879, 0.298235377, 0.397594876, 0.397594876, 0.397594876, 0.397594876], degree=3))
            Line((9.365071614, 0.1000009), (8.3, 0.1))
            Line((8.3, 0.1), (8.3, 0.3))
        make_face()
    extrude(amount=EXTRUDE_5_DEPTH + EXTRUDE_5_DEPTH_BACK)

    # 草图3 → 切除-拉伸1 (cut)
    with BuildSketch(Plane(origin=(0, 1.19, 0), x_dir=(1, 0, 0), z_dir=(0, 1, 0))):
        with Locations((-0.4, 0)):
            Rectangle(SKETCH_3_W, SKETCH_3_H)
    extrude(amount=-CUT_EXTRUDE_1_DEPTH, mode=Mode.SUBTRACT)


solid = part.part
